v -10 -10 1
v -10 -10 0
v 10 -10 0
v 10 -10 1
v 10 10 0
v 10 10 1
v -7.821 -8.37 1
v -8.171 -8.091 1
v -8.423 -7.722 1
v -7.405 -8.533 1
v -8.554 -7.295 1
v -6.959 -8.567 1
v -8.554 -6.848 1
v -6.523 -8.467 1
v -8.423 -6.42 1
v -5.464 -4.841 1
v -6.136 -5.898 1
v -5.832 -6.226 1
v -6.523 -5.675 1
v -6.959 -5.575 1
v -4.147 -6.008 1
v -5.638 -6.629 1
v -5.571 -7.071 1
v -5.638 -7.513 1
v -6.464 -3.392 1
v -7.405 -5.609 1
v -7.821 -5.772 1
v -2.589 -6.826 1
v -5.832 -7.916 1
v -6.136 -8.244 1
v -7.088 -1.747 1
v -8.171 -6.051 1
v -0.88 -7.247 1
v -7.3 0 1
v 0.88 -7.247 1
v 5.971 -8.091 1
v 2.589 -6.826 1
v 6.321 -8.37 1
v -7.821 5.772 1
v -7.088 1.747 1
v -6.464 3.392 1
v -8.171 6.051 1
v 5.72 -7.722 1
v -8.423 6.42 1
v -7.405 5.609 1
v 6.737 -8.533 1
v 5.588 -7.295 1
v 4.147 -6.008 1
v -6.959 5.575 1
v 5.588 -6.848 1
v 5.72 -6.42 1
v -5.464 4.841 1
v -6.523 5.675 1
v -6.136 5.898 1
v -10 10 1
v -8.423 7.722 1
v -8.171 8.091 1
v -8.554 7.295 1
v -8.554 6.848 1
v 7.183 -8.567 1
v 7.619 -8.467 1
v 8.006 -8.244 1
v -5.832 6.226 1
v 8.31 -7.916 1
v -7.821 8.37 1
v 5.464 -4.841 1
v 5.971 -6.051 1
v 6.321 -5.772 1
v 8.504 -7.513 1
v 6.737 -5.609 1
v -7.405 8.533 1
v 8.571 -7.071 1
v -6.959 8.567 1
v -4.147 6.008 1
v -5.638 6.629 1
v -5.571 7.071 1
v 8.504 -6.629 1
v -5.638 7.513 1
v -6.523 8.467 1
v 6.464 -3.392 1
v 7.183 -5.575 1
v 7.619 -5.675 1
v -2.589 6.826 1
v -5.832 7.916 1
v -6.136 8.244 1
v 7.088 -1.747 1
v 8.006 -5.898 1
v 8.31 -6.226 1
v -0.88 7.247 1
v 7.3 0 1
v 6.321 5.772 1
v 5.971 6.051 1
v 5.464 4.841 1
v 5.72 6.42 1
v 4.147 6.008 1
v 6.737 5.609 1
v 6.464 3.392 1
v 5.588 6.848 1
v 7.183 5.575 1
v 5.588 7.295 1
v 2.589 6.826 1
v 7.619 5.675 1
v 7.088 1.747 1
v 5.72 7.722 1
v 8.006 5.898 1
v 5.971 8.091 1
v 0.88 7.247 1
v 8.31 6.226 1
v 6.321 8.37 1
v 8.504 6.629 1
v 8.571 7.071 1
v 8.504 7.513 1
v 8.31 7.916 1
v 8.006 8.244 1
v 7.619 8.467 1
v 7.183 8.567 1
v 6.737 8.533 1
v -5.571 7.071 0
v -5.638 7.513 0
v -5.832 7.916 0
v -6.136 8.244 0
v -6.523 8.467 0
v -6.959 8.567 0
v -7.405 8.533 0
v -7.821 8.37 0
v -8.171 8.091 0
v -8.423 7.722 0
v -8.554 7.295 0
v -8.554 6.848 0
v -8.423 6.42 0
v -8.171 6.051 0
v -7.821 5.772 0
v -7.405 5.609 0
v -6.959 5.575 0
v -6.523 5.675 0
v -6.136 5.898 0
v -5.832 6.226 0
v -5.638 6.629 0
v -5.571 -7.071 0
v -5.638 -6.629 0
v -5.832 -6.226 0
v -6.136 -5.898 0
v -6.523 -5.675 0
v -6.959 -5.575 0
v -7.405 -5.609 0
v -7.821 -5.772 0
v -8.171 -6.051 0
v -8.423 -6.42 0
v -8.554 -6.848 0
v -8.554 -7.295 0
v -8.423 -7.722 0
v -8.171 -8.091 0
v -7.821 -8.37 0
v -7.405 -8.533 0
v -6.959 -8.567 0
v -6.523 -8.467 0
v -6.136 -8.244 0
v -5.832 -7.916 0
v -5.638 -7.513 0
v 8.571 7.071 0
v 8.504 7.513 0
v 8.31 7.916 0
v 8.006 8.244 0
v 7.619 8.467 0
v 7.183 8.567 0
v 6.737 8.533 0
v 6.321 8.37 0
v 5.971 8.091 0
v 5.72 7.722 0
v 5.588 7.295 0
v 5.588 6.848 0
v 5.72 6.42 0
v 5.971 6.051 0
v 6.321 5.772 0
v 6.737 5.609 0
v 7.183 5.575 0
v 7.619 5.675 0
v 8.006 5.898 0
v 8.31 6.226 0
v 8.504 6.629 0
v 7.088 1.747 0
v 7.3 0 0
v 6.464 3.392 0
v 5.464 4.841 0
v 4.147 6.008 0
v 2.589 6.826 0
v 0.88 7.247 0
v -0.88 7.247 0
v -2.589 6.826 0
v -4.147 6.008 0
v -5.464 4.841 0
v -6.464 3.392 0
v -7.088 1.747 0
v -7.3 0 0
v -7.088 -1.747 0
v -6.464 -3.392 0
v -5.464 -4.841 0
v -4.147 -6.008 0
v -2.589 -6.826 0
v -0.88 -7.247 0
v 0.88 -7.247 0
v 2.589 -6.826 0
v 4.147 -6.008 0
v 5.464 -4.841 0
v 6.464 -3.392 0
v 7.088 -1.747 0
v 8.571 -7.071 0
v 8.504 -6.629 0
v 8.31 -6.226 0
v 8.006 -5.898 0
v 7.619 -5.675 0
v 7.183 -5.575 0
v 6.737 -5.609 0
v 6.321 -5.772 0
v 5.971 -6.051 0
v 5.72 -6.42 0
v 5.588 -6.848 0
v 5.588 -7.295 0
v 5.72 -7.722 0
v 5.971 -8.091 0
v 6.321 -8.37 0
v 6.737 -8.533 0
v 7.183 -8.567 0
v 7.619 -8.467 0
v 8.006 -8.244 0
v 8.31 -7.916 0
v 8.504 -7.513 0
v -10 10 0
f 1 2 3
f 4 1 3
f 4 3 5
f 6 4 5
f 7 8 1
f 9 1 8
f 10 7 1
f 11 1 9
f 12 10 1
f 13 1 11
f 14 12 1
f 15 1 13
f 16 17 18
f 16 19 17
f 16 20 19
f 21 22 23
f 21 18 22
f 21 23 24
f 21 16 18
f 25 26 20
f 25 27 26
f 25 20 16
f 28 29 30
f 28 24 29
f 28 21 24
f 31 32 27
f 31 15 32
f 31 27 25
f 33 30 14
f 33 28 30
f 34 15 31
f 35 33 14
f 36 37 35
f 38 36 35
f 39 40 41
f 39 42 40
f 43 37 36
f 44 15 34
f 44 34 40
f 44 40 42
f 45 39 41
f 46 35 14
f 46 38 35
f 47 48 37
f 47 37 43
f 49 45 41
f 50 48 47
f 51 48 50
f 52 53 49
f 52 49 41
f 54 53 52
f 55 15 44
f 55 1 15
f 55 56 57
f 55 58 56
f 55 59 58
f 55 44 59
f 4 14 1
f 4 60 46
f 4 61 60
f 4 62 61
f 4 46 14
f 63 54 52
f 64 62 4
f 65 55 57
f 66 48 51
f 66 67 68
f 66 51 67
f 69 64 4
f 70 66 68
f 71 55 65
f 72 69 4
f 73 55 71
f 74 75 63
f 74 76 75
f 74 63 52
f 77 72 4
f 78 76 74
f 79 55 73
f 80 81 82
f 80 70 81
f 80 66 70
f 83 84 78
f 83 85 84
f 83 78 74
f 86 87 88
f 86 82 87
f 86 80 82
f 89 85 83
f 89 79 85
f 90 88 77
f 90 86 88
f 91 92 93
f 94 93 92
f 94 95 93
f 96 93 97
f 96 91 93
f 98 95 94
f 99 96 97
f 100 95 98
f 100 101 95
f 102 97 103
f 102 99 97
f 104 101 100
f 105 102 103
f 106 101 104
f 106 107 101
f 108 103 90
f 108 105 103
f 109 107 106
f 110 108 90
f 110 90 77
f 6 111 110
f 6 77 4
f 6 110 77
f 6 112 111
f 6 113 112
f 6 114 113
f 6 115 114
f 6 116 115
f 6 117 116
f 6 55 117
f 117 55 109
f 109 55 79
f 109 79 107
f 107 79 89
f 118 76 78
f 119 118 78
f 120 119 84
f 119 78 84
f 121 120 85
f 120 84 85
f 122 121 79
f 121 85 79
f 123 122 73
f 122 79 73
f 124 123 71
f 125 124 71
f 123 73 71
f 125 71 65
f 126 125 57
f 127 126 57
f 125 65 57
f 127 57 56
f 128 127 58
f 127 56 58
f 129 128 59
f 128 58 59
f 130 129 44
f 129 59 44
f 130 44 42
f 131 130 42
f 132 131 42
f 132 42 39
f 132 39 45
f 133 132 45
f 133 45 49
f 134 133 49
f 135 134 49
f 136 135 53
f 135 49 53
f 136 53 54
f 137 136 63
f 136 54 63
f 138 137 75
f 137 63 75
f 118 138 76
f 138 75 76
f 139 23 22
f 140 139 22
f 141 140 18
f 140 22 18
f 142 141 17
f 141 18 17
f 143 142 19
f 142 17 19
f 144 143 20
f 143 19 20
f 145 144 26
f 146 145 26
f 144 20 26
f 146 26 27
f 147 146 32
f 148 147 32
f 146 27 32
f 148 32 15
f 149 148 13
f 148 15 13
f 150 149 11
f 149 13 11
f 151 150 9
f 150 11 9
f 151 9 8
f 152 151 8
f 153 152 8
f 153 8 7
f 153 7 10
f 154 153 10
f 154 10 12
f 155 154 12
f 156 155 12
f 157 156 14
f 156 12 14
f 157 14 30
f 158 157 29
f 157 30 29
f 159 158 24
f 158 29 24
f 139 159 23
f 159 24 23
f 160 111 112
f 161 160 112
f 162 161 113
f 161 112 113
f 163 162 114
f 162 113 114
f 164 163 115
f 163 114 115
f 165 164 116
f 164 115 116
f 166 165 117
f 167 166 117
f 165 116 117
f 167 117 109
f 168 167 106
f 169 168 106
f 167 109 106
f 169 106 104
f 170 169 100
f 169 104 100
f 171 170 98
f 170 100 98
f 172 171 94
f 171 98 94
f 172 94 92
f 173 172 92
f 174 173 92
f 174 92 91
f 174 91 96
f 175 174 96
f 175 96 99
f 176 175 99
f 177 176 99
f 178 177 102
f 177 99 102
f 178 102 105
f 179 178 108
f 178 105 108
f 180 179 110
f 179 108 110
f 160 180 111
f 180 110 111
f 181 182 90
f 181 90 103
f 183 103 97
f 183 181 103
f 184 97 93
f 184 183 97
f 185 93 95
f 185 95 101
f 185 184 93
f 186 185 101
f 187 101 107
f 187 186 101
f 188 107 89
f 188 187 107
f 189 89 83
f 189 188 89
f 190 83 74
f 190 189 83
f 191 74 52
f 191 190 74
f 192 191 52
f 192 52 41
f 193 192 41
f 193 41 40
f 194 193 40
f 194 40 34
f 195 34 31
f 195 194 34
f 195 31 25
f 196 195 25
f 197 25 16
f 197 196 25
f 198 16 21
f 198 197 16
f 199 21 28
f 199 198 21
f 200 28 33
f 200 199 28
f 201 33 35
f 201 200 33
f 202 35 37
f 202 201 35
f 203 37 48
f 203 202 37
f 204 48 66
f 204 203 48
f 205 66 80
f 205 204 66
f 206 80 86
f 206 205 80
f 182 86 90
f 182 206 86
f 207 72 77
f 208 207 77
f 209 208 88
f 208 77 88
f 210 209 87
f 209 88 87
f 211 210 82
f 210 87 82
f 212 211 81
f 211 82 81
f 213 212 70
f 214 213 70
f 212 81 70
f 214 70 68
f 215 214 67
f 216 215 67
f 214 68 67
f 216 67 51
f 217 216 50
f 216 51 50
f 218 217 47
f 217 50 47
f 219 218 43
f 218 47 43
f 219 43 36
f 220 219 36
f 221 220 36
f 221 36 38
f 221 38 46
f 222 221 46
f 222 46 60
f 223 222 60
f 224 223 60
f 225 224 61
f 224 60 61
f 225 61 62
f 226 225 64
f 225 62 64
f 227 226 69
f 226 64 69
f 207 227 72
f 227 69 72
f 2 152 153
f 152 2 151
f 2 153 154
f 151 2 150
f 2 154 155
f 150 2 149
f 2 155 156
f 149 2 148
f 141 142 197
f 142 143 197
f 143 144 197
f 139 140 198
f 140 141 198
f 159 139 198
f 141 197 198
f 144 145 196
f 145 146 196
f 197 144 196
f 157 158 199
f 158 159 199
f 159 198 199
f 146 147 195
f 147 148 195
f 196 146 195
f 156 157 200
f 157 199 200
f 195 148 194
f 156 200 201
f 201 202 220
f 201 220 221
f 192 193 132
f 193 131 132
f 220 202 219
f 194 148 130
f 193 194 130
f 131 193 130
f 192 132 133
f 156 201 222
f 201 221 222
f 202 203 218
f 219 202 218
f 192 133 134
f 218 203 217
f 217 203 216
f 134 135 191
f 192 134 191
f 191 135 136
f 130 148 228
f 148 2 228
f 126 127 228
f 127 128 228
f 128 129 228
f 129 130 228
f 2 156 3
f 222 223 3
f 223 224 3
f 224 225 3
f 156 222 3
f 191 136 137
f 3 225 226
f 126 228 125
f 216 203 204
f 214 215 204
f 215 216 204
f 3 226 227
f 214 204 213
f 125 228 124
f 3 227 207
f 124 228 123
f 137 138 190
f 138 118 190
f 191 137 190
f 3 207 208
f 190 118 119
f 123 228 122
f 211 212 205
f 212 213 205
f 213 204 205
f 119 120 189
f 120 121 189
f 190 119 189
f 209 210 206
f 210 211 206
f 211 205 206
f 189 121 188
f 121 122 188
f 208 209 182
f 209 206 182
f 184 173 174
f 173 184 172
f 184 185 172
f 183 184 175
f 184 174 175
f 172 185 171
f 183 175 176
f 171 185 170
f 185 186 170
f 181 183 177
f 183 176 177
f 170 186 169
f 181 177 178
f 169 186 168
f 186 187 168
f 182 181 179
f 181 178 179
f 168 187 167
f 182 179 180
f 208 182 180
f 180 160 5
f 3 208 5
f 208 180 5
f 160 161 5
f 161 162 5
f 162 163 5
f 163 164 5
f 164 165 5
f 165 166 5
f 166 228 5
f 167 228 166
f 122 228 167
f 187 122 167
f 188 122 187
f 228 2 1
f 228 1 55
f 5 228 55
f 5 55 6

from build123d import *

# Parameters (mm, degrees)
SKETCH1_W           = 20
SKETCH1_H           = 20
SKETCH1_R           = 7.3
BOSS_EXTRUDE1_DEPTH = 1
SKETCH2_R           = 1.5
CUT_EXTRUDE1_DEPTH  = 1


with BuildPart() as part:
    # Sketch1 → Boss-Extrude1 (new body)
    with BuildSketch(Plane.XY):
        Rectangle(SKETCH1_W, SKETCH1_H)
        Circle(SKETCH1_R, mode=Mode.SUBTRACT)
    extrude(amount=BOSS_EXTRUDE1_DEPTH)

    # Sketch2 → Cut-Extrude1 (cut)
    with BuildSketch(Plane.XY.offset(1)):
        with Locations((-7.071067812, 7.071067812)):
            Circle(SKETCH2_R)
        with Locations((7.071067812, 7.071067812)):
            Circle(SKETCH2_R)
        with Locations((7.071067812, -7.071067812)):
            Circle(SKETCH2_R)
        with Locations((-7.071067812, -7.071067812)):
            Circle(SKETCH2_R)
    extrude(amount=-CUT_EXTRUDE1_DEPTH, mode=Mode.SUBTRACT)


solid = part.part
